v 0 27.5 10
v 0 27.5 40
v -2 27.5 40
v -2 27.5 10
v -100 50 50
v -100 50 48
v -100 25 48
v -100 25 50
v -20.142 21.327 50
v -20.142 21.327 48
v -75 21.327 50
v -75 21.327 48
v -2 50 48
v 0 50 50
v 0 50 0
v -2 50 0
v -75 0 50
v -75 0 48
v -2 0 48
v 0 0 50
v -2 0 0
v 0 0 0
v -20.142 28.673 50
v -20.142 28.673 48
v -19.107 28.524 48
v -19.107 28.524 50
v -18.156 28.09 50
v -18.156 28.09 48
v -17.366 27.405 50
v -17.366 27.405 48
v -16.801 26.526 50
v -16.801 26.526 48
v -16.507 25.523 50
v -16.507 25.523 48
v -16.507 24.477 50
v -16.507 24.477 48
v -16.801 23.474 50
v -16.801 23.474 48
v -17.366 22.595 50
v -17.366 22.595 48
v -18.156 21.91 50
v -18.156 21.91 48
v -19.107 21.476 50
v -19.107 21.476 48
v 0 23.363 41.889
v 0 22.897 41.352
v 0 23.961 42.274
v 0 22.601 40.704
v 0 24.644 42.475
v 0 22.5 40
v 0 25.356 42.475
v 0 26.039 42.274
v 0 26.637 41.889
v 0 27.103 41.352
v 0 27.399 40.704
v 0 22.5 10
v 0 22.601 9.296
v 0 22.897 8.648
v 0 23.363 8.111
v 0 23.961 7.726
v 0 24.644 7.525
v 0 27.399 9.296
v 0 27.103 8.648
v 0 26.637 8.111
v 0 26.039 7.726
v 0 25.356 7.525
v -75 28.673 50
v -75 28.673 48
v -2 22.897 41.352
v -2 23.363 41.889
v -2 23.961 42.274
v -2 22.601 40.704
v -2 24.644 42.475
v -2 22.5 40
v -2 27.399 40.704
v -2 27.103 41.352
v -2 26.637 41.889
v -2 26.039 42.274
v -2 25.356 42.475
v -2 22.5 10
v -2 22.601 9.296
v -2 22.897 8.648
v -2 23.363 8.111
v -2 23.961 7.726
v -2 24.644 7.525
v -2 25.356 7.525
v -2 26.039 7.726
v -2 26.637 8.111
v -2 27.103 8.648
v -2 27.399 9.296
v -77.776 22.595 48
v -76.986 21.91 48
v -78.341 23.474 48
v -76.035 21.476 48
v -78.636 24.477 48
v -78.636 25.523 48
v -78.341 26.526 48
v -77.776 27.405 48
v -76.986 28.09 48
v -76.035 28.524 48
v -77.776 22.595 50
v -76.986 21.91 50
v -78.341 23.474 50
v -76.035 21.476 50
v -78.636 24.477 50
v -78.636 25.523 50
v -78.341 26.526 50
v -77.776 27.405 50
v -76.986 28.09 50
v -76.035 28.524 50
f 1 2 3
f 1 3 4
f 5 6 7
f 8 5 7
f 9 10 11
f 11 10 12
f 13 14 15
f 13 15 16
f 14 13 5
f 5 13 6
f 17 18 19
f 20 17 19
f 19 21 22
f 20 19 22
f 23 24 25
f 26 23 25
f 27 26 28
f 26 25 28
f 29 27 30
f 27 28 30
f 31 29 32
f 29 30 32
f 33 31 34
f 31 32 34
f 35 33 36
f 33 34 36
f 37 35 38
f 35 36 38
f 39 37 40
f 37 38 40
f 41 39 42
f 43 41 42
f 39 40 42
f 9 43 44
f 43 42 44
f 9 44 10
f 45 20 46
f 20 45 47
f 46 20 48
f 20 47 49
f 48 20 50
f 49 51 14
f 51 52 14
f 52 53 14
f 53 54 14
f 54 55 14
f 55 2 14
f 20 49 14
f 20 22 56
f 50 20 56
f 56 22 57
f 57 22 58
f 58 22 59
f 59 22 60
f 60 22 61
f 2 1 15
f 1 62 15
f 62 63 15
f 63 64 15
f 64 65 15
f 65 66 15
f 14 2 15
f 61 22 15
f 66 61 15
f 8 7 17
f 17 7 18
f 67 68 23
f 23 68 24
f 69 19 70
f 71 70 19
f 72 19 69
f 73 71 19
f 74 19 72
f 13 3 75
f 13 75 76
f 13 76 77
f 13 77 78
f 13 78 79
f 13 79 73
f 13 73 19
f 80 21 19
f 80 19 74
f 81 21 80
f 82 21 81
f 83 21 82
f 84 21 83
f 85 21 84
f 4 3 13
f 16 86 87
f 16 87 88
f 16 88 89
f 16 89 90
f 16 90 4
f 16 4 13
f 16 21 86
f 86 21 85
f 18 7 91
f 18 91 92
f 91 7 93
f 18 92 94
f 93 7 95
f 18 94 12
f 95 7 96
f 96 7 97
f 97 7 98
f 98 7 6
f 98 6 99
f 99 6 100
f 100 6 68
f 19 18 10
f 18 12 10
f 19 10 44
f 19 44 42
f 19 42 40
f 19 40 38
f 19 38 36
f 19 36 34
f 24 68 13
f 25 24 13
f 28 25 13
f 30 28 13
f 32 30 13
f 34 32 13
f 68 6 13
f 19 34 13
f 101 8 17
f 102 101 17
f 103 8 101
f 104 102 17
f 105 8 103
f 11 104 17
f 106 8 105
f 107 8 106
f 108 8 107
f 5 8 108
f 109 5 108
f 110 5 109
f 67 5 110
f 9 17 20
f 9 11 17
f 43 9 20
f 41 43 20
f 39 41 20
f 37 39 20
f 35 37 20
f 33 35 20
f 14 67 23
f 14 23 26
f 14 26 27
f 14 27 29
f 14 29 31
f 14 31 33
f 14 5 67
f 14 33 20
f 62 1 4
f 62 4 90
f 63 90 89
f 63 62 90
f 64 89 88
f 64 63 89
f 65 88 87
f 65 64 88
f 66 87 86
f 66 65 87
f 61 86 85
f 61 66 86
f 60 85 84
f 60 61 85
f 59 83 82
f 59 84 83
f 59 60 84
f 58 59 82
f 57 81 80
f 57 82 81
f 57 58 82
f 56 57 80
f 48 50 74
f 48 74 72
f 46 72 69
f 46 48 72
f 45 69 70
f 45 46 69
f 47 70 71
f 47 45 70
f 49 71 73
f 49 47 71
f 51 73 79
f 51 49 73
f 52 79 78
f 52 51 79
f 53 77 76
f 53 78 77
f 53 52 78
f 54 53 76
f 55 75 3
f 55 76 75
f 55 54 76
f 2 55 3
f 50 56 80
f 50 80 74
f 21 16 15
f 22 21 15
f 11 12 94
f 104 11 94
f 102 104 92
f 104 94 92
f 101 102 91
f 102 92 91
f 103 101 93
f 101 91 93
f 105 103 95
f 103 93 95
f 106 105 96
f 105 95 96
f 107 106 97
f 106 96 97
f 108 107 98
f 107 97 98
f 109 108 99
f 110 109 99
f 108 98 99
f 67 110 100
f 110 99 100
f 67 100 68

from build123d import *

# Parameters (mm, degrees)
BOSS_EXTRUDE1_DEPTH = 50
SHELL2_T            = -2
CUT_EXTRUDE1_DEPTH  = 60


with BuildPart() as part:
    # Sketch1 → Boss-Extrude1 (new body)
    with BuildSketch(Plane.XY):
        Polygon((-100, 25), (-75, 0), (0, 0), (0, 50), (-100, 50), align=None)
        with BuildLine():
            ThreePointArc((-75, 21.327014218), (-78.672985782, 25), (-75, 28.672985782))
            Line((-75, 28.672985782), (-20.142180095, 28.672985782))
            ThreePointArc((-20.142180095, 28.672985782), (-16.469194313, 25), (-20.142180095, 21.327014218))
            Line((-20.142180095, 21.327014218), (-75, 21.327014218))
        make_face(mode=Mode.SUBTRACT)
    extrude(amount=BOSS_EXTRUDE1_DEPTH)

    # Shell2
    shell2_openings = [part.faces().sort_by_distance(p)[0] for p in [
        (-87.5, 12.5, 25),
        (-37.5, 0, 25),
        (-50, 50, 25),
        (-100, 37.5, 25),
        (-78.672985782, 25, 25),
        (-47.571090047, 28.672985782, 25),
        (-16.469194313, 25, 25),
        (-47.571090047, 21.327014218, 25),
        (-86.709430585, 13.290569415, 0),
    ]]
    offset(amount=SHELL2_T, openings=shell2_openings, kind=Kind.INTERSECTION)

    # Sketch2 → Cut-Extrude1 (cut)
    with BuildSketch(Plane(origin=(0, 0, 0), x_dir=(0, 0, -1), z_dir=(1, 0, 0))):
        with BuildLine():
            Line((-40, 27.5), (-10, 27.5))
            ThreePointArc((-10, 27.5), (-7.5, 25), (-10, 22.5))
            Line((-10, 22.5), (-40, 22.5))
            ThreePointArc((-40, 22.5), (-42.5, 25), (-40, 27.5))
        make_face()
    extrude(amount=-CUT_EXTRUDE1_DEPTH, mode=Mode.SUBTRACT)


solid = part.part
